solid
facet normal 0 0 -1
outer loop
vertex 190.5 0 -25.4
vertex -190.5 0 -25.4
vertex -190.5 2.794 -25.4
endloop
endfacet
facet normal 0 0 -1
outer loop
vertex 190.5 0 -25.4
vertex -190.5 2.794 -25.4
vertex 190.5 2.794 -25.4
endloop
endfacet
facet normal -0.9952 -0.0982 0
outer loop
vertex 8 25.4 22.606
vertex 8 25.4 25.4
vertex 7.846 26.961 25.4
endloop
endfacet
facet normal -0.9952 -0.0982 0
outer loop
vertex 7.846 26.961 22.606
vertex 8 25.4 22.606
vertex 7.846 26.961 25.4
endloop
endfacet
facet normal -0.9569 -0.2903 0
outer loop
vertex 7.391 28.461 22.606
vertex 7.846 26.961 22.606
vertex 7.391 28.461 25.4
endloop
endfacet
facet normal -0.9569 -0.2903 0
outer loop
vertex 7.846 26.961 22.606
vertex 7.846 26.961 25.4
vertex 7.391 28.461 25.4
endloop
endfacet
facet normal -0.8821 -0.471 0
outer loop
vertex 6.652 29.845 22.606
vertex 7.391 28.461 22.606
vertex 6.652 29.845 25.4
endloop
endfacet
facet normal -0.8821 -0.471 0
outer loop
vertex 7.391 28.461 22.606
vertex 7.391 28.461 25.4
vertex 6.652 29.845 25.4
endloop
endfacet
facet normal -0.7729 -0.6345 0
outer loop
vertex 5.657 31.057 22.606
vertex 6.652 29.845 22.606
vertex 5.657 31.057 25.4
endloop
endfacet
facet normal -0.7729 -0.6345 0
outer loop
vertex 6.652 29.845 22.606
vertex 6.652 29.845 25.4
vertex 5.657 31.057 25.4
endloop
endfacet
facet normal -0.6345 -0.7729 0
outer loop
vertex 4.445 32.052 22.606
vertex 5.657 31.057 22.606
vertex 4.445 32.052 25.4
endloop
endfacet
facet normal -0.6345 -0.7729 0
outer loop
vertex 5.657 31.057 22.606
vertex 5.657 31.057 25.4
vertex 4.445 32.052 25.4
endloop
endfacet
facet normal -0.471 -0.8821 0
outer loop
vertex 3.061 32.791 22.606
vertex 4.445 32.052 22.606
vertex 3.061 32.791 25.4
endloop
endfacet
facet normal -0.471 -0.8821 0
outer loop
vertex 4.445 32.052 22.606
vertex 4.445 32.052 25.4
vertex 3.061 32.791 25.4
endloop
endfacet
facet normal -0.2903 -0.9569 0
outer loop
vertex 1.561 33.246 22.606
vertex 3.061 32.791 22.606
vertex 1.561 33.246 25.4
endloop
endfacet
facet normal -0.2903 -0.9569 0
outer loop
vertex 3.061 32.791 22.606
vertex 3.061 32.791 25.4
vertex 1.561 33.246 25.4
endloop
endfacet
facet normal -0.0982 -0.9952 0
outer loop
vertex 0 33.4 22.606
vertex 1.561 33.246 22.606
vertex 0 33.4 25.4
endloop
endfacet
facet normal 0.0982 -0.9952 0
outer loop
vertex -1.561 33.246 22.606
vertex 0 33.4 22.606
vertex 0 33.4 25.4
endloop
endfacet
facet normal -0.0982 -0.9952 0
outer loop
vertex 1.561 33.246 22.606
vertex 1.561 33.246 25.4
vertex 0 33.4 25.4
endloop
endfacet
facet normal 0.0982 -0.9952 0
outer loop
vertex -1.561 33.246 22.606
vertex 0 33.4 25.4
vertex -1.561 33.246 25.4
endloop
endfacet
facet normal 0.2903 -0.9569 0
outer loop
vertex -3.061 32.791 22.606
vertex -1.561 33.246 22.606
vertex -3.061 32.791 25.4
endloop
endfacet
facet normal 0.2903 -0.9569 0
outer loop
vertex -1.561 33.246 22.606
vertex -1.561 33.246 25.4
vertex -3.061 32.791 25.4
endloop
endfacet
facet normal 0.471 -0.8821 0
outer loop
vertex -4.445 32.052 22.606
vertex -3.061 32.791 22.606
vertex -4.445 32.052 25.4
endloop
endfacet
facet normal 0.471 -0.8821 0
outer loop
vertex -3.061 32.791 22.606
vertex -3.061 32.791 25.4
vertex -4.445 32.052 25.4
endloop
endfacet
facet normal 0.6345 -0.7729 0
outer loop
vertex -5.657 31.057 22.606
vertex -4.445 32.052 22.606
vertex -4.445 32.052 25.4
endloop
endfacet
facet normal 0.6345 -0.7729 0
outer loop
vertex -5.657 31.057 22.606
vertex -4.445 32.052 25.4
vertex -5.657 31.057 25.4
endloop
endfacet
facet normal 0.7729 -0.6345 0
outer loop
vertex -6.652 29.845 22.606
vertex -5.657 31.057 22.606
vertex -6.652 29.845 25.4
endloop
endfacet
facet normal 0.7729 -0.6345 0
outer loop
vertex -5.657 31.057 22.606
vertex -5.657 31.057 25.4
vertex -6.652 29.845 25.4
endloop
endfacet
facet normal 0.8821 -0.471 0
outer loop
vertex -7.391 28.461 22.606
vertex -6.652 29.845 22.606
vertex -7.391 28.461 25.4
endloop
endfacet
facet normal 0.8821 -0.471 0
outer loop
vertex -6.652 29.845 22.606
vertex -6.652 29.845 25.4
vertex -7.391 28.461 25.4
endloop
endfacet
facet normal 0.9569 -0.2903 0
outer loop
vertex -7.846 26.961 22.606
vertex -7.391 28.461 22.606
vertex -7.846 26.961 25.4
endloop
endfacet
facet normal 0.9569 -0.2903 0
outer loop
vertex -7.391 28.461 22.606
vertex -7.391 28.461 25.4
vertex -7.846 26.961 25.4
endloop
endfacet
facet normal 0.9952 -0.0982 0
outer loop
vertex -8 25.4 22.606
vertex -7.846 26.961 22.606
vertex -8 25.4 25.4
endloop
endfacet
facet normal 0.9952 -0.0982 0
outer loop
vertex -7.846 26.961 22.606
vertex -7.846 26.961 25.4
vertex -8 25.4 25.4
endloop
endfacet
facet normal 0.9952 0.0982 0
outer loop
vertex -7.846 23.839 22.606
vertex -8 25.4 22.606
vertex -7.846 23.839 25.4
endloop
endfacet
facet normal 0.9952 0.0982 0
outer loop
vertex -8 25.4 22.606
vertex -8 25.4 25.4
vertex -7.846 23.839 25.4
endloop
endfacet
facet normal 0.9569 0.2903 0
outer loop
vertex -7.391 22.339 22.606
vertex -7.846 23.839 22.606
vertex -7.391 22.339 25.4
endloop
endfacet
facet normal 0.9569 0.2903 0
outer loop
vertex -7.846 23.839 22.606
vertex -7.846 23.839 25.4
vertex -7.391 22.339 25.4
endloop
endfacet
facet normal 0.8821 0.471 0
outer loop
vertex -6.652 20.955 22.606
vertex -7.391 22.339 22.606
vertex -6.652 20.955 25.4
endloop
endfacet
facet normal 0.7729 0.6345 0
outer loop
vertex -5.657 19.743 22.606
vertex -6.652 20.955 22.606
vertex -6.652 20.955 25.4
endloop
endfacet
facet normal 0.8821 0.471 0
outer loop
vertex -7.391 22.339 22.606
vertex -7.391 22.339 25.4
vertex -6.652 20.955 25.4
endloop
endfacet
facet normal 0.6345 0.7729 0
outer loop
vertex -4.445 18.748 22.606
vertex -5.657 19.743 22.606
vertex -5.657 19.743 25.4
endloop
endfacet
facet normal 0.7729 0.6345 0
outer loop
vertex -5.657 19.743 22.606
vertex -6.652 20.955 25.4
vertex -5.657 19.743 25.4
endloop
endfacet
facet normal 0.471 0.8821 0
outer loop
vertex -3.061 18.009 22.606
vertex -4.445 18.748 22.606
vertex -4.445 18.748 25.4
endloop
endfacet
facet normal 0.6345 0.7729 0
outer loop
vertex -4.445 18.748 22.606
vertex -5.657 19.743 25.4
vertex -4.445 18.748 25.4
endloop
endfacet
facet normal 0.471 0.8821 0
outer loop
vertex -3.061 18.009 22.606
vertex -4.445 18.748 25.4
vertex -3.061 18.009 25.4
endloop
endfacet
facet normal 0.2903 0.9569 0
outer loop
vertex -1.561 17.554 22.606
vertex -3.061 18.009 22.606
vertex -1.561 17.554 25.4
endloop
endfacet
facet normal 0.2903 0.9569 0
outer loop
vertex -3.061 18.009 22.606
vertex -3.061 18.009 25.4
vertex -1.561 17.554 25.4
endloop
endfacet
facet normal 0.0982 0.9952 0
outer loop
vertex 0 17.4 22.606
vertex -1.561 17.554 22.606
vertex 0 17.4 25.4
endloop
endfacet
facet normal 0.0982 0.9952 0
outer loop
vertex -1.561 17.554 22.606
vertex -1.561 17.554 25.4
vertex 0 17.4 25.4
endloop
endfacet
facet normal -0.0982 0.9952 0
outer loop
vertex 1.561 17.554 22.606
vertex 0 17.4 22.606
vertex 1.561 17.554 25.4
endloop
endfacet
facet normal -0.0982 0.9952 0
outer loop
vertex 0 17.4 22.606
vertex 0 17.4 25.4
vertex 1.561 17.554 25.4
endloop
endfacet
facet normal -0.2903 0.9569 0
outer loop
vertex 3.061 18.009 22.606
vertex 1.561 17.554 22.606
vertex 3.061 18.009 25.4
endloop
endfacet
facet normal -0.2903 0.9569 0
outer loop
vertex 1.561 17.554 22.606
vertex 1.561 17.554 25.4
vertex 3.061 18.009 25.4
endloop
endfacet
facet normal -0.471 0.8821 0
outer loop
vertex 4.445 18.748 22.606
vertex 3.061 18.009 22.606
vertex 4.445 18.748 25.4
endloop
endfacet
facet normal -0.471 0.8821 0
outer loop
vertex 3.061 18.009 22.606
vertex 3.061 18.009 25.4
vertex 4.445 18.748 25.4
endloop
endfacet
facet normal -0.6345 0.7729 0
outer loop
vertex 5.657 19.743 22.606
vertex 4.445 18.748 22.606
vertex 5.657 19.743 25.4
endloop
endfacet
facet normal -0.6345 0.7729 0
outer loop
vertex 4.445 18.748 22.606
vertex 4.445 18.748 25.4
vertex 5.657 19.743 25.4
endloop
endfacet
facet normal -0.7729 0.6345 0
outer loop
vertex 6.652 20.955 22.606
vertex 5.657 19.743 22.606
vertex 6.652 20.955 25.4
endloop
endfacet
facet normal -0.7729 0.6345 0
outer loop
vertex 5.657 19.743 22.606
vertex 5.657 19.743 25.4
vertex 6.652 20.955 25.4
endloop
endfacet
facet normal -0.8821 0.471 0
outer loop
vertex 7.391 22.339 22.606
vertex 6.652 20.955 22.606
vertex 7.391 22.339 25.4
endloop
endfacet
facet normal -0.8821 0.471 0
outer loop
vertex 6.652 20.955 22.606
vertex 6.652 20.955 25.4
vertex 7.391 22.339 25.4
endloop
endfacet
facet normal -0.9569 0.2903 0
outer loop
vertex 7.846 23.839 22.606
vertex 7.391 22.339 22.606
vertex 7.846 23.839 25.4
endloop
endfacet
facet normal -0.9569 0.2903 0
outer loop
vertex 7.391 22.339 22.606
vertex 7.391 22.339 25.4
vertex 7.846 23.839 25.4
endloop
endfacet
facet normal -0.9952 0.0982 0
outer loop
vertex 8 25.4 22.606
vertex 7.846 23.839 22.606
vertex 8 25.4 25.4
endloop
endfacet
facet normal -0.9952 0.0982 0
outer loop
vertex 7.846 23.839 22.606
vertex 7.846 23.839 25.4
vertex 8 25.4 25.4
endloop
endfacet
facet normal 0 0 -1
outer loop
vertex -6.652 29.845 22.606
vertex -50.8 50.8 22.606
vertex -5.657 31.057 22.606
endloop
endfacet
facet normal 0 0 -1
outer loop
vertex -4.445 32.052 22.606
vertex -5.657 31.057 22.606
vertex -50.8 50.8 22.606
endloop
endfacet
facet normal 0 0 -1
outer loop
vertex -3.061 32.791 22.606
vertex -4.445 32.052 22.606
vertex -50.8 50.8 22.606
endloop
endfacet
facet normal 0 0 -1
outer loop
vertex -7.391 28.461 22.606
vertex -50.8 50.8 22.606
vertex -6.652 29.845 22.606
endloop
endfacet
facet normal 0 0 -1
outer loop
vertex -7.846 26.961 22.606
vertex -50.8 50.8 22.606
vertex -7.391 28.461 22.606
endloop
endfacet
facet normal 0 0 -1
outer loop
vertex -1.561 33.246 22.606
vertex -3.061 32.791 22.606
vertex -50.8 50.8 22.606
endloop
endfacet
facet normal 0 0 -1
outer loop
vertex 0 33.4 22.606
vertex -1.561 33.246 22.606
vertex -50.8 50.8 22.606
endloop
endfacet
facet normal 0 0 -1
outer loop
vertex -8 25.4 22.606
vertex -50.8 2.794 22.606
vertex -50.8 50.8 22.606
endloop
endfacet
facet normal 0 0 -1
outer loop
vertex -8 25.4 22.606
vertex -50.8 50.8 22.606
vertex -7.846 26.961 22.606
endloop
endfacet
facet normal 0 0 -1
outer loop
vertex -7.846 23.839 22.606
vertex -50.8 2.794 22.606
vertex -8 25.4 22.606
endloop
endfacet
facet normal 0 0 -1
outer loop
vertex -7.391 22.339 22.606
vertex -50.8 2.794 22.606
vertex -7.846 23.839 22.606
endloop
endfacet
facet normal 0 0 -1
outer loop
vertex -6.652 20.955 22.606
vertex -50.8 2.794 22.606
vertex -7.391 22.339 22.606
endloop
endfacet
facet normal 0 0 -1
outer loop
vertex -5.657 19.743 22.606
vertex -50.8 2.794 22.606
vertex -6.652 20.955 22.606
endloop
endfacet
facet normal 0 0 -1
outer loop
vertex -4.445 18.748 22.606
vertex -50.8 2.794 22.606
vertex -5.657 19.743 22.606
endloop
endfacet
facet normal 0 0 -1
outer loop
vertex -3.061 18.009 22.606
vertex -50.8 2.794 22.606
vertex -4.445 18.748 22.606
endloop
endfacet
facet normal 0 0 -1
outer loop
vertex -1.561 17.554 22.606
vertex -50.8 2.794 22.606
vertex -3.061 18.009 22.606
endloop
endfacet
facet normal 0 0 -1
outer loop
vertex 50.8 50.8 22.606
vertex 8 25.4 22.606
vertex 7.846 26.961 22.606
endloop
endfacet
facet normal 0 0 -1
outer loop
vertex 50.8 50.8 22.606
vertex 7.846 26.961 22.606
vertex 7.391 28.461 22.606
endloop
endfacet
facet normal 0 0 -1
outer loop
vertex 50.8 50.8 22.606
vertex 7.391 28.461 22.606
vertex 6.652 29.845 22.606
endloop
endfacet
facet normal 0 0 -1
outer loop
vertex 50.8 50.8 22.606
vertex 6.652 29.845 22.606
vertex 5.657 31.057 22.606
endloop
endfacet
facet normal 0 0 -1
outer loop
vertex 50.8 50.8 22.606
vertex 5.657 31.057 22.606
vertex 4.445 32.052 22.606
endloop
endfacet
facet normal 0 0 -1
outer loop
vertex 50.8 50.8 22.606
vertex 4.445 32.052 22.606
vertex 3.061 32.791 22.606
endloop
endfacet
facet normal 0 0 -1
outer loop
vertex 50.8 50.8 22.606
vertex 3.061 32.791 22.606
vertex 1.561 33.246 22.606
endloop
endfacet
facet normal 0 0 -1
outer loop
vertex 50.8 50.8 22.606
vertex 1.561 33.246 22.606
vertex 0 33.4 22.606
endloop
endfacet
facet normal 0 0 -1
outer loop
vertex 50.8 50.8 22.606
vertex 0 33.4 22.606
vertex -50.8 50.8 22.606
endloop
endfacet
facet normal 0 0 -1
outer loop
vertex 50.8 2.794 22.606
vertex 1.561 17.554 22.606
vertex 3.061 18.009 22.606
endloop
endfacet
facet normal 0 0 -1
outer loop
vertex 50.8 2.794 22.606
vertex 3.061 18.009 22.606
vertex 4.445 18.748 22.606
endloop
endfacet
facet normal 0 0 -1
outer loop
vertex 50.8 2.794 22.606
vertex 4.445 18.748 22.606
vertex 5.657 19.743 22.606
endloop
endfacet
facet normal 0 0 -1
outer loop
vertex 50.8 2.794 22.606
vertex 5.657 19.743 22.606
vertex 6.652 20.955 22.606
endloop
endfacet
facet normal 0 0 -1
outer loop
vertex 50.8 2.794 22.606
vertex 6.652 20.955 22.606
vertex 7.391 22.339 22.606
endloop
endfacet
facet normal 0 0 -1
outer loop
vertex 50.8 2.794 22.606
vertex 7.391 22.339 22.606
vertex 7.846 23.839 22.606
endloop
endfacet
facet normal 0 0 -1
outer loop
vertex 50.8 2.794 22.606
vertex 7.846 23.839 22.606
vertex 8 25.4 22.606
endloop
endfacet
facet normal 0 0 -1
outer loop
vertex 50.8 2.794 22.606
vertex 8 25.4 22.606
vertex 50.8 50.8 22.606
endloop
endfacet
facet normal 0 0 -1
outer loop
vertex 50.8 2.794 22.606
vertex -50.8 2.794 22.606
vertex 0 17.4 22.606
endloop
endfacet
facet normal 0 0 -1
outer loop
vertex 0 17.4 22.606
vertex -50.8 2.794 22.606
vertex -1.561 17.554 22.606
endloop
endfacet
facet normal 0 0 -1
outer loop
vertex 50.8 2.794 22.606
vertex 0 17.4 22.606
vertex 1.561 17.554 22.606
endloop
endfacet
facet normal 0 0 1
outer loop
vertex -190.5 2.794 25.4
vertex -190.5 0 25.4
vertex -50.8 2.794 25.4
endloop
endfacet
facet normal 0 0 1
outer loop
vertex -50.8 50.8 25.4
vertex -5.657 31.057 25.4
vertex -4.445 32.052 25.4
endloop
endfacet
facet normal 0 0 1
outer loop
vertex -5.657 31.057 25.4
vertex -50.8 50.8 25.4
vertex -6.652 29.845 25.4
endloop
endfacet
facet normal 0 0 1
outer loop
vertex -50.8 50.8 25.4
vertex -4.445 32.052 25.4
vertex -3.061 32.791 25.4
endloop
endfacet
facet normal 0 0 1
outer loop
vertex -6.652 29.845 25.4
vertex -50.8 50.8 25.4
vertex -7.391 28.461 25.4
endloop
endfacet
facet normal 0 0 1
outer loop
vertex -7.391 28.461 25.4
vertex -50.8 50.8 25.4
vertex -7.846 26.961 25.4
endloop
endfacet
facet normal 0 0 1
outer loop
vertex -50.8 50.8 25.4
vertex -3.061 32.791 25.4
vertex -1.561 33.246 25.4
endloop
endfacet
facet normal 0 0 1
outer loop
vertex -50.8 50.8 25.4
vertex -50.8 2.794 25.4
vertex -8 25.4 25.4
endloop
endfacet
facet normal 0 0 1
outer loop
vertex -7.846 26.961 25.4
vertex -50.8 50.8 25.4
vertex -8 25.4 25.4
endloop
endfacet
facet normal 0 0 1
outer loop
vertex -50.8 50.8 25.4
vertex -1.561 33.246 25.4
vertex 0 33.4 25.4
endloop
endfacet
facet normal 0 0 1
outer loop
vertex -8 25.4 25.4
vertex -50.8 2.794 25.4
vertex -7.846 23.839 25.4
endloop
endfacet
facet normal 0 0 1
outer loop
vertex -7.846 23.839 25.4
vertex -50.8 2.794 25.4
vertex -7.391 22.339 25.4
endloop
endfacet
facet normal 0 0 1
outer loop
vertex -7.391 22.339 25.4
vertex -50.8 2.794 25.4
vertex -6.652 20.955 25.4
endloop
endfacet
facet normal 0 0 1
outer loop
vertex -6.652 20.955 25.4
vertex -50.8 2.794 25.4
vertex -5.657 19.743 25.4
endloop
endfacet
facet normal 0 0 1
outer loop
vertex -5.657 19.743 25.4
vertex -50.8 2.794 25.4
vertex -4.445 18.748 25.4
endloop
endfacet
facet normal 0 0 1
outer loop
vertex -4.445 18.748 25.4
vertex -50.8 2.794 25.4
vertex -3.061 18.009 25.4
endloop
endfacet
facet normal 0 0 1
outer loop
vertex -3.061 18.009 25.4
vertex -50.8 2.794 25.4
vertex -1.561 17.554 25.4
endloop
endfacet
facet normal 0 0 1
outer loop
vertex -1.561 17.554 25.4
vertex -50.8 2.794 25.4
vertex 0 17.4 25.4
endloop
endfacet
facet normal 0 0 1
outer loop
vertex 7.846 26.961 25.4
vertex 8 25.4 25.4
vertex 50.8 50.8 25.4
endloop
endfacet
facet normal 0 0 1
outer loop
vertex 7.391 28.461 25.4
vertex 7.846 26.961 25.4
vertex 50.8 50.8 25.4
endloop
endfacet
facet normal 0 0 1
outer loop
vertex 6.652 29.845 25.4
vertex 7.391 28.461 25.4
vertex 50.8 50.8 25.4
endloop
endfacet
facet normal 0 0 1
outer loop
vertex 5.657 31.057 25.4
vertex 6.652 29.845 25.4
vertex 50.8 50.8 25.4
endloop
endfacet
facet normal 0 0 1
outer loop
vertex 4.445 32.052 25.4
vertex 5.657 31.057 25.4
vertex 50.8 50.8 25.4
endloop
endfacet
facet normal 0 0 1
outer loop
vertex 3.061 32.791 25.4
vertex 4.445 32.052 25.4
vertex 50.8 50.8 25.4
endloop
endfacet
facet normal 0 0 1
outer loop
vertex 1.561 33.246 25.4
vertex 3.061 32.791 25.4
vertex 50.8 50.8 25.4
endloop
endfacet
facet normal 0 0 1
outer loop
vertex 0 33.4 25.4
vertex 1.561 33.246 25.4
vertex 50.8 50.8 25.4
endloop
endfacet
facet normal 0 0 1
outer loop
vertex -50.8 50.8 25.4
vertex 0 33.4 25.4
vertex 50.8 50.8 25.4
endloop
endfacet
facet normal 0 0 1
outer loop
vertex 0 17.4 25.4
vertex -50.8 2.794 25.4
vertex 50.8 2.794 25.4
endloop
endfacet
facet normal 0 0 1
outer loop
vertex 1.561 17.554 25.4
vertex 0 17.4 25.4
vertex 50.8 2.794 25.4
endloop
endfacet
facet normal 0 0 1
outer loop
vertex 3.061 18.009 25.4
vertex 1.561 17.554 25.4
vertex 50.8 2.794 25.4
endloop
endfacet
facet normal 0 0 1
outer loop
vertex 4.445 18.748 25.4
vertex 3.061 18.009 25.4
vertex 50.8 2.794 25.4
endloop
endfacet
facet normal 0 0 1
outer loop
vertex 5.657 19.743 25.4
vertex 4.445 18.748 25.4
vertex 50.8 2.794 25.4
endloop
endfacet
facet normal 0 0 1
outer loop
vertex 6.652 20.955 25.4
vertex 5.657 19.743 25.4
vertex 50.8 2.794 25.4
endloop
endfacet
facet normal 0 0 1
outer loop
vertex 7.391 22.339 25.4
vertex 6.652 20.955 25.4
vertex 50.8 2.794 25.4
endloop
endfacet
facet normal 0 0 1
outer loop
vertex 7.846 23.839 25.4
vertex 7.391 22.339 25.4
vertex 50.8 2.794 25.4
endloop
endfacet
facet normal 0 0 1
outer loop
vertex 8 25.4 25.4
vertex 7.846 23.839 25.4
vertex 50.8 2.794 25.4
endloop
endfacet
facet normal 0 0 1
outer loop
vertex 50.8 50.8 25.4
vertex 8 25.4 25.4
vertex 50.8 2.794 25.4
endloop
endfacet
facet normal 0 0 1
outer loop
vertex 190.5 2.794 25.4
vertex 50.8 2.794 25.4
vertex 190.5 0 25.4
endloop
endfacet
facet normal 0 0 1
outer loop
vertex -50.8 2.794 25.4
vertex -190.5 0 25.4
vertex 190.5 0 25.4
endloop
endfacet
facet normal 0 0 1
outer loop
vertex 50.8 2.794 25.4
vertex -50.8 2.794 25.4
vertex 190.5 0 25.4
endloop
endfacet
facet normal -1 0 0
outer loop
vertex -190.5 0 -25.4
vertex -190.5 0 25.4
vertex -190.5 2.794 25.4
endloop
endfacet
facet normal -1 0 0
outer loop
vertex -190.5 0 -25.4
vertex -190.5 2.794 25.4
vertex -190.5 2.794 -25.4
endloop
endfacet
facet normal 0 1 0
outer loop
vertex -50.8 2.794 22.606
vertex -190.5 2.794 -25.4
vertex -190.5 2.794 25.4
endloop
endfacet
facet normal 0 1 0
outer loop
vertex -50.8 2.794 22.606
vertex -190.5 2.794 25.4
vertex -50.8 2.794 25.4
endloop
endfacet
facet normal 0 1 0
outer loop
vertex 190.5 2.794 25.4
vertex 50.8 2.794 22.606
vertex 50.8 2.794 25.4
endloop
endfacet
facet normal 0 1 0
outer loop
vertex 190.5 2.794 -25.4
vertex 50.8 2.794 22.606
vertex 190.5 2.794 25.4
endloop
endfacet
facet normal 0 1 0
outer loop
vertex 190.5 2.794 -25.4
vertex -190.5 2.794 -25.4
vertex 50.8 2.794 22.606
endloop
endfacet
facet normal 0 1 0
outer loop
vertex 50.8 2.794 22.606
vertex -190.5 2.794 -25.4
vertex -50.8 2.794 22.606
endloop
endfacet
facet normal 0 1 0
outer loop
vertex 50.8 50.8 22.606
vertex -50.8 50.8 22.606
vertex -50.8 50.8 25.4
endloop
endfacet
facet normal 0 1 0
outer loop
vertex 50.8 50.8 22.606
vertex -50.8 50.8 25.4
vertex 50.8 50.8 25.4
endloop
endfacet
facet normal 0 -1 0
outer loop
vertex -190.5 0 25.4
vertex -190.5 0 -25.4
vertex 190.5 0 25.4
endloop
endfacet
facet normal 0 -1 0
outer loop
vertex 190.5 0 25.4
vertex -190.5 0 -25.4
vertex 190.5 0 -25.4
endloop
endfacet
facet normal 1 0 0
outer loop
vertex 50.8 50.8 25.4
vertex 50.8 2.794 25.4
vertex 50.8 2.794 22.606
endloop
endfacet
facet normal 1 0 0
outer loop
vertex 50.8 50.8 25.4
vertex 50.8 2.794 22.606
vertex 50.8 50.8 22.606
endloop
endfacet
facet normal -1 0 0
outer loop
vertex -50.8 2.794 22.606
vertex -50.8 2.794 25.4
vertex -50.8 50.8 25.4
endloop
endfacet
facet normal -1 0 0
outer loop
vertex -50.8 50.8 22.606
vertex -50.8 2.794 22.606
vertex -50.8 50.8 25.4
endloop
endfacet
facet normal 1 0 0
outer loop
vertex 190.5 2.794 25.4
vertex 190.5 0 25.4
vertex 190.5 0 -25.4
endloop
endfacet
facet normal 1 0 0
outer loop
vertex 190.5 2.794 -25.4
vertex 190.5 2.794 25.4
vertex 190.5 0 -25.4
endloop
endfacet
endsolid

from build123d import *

# Parameters (mm, degrees)
SKETCH1_W           = 381
SKETCH1_H           = 50.8
BOSS_EXTRUDE1_DEPTH = 2.794
SKETCH2_W           = 381
SKETCH2_H           = 2.794
BOSS_EXTRUDE2_DEPTH = 48.006
SKETCH3_R           = 8
CUT_EXTRUDE1_DEPTH  = 2.794
SKETCH4_W           = 139.7
SKETCH4_H           = 48.006
CUT_EXTRUDE2_DEPTH  = 2.794


with BuildPart() as part:
    # Sketch1 → Boss-Extrude1 (new body)
    with BuildSketch(Plane(origin=(0, 0, 0), x_dir=(1, 0, 0), z_dir=(0, 1, 0))):
        Rectangle(SKETCH1_W, SKETCH1_H)
    extrude(amount=BOSS_EXTRUDE1_DEPTH)

    # Sketch2 → Boss-Extrude2 (add)
    with BuildSketch(Plane(origin=(0, 2.794, 0), x_dir=(1, 0, 0), z_dir=(0, 1, 0))):
        with Locations((0, -24.003)):
            Rectangle(SKETCH2_W, SKETCH2_H)
    extrude(amount=BOSS_EXTRUDE2_DEPTH)

    # Sketch3 → Cut-Extrude1 (cut)
    with BuildSketch(Plane.XY.offset(25.4)):
        with Locations((0, 25.4)):
            Circle(SKETCH3_R)
    extrude(amount=-CUT_EXTRUDE1_DEPTH, mode=Mode.SUBTRACT)

    # Sketch4 → Cut-Extrude2 (cut)
    with BuildSketch(Plane.XY.offset(25.4)):
        with Locations((-120.65, 26.797)):
            Rectangle(SKETCH4_W, SKETCH4_H)
        with Locations((120.65, 26.797)):
            Rectangle(SKETCH4_W, SKETCH4_H)
    extrude(amount=-CUT_EXTRUDE2_DEPTH, mode=Mode.SUBTRACT)


solid = part.part
